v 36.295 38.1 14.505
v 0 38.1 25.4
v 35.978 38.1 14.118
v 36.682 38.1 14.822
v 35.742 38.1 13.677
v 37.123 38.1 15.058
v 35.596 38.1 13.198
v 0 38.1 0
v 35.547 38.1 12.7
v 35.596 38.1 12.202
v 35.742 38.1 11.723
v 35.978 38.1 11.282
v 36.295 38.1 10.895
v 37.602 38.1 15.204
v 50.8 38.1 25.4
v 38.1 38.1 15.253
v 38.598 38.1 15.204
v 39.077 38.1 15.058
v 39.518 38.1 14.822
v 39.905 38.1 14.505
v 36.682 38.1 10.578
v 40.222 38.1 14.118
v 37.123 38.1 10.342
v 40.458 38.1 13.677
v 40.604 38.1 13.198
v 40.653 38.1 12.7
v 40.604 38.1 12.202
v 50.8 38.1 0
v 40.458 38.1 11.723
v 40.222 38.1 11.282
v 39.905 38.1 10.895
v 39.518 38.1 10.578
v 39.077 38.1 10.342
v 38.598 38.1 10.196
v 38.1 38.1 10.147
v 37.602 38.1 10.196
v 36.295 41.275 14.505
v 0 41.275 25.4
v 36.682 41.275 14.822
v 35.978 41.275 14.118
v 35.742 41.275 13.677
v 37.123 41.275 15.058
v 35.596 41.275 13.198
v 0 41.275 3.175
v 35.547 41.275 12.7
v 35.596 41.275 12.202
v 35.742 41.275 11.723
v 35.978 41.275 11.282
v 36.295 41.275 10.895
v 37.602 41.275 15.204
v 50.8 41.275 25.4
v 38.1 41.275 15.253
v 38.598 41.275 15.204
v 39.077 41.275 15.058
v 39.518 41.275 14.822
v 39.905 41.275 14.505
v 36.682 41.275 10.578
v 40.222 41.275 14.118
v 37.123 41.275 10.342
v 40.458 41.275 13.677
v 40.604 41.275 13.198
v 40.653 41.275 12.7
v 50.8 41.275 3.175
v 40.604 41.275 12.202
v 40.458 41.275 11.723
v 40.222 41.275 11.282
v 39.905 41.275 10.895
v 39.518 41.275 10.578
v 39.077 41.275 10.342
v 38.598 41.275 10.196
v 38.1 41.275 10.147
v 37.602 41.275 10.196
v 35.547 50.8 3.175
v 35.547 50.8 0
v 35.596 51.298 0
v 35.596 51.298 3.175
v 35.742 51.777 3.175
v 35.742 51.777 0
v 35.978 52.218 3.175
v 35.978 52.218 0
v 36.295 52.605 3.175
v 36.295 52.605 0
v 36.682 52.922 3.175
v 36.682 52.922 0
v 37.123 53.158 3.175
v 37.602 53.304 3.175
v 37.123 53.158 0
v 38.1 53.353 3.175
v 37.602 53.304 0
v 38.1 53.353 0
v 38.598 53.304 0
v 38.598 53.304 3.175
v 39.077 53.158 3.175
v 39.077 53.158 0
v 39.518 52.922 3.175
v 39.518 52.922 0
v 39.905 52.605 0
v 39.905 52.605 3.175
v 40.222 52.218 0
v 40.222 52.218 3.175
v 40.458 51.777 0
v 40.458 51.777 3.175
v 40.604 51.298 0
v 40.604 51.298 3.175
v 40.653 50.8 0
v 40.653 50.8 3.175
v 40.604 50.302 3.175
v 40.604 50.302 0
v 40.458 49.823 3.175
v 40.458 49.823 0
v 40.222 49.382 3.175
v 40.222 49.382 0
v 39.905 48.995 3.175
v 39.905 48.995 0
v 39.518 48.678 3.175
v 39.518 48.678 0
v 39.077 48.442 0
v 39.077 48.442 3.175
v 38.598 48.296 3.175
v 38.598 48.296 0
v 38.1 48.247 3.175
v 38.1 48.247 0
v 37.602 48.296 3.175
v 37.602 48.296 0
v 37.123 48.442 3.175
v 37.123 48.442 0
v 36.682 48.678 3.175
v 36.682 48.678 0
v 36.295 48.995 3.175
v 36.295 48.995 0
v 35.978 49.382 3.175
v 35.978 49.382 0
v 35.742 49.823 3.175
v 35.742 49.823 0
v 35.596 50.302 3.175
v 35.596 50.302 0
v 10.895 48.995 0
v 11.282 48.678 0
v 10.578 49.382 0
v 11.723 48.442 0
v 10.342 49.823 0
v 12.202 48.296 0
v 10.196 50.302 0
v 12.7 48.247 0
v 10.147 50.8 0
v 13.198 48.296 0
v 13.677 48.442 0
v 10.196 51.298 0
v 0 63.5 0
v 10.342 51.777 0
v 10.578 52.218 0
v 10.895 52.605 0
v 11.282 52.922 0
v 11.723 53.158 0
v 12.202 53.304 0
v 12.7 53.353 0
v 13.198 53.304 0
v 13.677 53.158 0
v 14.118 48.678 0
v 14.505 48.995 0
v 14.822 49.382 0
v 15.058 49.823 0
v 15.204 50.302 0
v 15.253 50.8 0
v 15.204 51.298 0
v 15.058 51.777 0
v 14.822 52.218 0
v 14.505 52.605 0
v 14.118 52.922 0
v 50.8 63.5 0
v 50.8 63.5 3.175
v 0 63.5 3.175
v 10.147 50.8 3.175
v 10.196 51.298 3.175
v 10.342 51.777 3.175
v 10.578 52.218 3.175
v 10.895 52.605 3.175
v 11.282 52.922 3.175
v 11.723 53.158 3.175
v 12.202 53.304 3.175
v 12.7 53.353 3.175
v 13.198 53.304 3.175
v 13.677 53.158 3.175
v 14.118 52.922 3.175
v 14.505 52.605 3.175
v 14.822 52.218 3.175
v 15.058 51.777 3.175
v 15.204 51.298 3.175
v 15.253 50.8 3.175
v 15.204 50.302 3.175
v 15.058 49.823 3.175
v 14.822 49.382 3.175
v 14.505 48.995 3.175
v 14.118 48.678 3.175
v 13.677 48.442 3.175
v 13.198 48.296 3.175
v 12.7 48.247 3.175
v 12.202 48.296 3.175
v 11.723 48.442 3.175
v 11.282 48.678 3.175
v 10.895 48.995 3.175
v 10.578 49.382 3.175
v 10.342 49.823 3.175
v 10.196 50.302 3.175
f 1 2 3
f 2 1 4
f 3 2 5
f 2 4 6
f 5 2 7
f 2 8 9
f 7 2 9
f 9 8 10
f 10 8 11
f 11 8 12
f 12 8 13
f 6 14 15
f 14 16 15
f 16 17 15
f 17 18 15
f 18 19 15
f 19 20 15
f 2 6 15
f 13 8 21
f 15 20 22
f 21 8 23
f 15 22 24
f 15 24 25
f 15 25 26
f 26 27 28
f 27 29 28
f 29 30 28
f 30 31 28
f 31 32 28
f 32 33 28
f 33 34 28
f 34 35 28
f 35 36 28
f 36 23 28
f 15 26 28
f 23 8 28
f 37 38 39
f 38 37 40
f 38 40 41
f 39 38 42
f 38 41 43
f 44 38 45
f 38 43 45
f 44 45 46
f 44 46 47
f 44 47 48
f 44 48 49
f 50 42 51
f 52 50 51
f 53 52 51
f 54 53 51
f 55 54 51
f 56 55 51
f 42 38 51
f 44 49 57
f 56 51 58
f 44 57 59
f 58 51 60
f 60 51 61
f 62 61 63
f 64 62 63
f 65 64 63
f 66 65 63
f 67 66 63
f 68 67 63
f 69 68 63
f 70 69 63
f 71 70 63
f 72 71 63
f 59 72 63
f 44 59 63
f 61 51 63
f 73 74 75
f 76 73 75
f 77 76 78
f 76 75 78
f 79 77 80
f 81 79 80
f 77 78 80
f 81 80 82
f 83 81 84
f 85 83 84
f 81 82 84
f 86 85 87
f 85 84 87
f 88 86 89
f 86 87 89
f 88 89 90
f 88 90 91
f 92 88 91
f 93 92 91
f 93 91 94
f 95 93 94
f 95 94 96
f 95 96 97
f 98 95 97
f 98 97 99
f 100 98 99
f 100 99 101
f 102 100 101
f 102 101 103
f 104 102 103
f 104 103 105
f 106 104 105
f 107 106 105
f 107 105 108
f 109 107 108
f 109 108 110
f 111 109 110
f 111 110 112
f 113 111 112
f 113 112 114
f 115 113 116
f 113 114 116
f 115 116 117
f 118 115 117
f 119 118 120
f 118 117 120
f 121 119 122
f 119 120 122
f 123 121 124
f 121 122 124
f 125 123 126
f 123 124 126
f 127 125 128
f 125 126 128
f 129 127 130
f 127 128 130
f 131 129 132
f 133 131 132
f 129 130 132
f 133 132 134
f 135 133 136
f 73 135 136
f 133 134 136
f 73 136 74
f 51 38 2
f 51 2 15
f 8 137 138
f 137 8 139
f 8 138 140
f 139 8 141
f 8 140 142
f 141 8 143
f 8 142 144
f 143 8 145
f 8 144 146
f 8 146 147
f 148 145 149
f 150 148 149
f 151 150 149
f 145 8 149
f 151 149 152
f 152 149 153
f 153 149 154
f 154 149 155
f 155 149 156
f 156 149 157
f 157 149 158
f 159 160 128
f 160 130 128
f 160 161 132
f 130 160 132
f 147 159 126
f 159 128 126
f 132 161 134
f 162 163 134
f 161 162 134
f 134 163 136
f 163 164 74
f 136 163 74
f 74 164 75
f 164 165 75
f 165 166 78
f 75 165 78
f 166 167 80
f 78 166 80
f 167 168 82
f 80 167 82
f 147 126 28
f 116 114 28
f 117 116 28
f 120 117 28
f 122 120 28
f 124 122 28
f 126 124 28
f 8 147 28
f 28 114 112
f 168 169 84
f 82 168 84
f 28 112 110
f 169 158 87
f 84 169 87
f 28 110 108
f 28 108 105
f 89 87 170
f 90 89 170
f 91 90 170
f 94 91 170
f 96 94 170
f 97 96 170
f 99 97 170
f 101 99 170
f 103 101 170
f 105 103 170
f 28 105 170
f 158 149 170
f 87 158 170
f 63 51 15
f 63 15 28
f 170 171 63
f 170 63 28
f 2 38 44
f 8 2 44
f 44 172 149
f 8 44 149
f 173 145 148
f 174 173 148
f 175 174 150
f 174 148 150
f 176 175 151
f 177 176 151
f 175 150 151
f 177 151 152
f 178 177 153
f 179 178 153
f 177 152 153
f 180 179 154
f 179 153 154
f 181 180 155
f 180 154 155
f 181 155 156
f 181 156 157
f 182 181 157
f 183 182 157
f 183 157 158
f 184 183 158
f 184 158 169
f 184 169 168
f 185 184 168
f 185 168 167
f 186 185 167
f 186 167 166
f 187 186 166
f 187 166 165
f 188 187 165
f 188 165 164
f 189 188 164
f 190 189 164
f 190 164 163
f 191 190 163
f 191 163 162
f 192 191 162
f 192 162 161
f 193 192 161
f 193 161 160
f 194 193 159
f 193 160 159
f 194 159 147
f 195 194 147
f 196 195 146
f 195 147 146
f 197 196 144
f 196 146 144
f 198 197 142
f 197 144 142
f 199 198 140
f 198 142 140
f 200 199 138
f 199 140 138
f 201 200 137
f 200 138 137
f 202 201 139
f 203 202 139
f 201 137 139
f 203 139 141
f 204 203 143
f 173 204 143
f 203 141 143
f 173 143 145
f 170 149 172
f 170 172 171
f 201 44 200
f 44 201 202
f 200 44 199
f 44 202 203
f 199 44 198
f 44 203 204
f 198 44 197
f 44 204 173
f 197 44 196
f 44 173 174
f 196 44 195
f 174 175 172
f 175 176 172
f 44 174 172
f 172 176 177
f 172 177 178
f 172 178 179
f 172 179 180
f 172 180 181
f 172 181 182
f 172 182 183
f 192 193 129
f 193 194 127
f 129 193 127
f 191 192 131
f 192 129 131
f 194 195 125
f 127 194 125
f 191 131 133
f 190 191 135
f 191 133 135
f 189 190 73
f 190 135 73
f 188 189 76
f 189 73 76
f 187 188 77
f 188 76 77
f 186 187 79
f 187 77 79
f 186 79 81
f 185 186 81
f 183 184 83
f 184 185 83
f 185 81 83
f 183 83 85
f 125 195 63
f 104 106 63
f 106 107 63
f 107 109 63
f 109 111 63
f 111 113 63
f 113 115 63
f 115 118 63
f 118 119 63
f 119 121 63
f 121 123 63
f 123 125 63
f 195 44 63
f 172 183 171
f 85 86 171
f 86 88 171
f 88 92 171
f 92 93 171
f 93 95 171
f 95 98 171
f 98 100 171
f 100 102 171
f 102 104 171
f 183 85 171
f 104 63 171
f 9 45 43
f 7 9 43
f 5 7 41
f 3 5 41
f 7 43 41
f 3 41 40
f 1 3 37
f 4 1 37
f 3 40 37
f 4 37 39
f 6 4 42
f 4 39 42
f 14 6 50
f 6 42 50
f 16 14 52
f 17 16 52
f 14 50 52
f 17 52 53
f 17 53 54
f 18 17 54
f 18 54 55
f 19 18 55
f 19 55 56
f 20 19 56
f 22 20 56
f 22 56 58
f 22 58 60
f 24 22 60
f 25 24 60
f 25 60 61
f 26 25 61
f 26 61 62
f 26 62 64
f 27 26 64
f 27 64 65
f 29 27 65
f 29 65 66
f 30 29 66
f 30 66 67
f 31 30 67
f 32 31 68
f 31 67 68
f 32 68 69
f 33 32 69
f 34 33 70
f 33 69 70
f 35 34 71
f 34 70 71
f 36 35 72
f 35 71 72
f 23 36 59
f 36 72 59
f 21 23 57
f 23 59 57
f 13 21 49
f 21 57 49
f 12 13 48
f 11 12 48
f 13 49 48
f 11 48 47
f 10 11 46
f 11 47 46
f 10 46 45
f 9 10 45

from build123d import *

# Parameters (mm, degrees)
SKETCH1_W                      = 50.8
SKETCH1_H                      = 25.4
BOSS_EXTRUDE1_DEPTH            = 25.4
SKETCH2_W                      = 22.225
SKETCH2_H                      = 22.225
CUT_EXTRUDE1_DEPTH             = 86.194189943
F_7_0_201_DIAMETER_HOLE1_D     = 5.1054
F_7_0_201_DIAMETER_HOLE1_DEPTH = 25.4
F_7_0_201_DIAMETER_HOLE2_D     = 5.1054


with BuildPart() as part:
    # Sketch1 → Boss-Extrude1 (new body)
    with BuildSketch(Plane(origin=(0, 63.5, 0), x_dir=(1, 0, 0), z_dir=(0, 1, 0))):
        with Locations((25.4, -12.7)):
            Rectangle(SKETCH1_W, SKETCH1_H)
    extrude(amount=-BOSS_EXTRUDE1_DEPTH)

    # Sketch2 → Cut-Extrude1 (cut, through all)
    with BuildSketch(Plane(origin=(50.8, 0, 0), x_dir=(0, 0, -1), z_dir=(1, 0, 0))):
        with Locations((-14.2875, 52.3875)):
            Rectangle(SKETCH2_W, SKETCH2_H)
    extrude(amount=-CUT_EXTRUDE1_DEPTH, mode=Mode.SUBTRACT)

    # #7 (0.201) Diameter Hole1
    with Locations(Plane.XZ.offset(-38.1)):
        with Locations((-12.7, -12.7), (38.1, 12.7)):
            Hole(F_7_0_201_DIAMETER_HOLE1_D / 2, depth=F_7_0_201_DIAMETER_HOLE1_DEPTH)

    # #7 (0.201) Diameter Hole2 (through all)
    with Locations(Plane.XY.offset(3.175)):
        with Locations((38.1, 50.8), (12.7, 50.8)):
            Hole(F_7_0_201_DIAMETER_HOLE2_D / 2)


solid = part.part
